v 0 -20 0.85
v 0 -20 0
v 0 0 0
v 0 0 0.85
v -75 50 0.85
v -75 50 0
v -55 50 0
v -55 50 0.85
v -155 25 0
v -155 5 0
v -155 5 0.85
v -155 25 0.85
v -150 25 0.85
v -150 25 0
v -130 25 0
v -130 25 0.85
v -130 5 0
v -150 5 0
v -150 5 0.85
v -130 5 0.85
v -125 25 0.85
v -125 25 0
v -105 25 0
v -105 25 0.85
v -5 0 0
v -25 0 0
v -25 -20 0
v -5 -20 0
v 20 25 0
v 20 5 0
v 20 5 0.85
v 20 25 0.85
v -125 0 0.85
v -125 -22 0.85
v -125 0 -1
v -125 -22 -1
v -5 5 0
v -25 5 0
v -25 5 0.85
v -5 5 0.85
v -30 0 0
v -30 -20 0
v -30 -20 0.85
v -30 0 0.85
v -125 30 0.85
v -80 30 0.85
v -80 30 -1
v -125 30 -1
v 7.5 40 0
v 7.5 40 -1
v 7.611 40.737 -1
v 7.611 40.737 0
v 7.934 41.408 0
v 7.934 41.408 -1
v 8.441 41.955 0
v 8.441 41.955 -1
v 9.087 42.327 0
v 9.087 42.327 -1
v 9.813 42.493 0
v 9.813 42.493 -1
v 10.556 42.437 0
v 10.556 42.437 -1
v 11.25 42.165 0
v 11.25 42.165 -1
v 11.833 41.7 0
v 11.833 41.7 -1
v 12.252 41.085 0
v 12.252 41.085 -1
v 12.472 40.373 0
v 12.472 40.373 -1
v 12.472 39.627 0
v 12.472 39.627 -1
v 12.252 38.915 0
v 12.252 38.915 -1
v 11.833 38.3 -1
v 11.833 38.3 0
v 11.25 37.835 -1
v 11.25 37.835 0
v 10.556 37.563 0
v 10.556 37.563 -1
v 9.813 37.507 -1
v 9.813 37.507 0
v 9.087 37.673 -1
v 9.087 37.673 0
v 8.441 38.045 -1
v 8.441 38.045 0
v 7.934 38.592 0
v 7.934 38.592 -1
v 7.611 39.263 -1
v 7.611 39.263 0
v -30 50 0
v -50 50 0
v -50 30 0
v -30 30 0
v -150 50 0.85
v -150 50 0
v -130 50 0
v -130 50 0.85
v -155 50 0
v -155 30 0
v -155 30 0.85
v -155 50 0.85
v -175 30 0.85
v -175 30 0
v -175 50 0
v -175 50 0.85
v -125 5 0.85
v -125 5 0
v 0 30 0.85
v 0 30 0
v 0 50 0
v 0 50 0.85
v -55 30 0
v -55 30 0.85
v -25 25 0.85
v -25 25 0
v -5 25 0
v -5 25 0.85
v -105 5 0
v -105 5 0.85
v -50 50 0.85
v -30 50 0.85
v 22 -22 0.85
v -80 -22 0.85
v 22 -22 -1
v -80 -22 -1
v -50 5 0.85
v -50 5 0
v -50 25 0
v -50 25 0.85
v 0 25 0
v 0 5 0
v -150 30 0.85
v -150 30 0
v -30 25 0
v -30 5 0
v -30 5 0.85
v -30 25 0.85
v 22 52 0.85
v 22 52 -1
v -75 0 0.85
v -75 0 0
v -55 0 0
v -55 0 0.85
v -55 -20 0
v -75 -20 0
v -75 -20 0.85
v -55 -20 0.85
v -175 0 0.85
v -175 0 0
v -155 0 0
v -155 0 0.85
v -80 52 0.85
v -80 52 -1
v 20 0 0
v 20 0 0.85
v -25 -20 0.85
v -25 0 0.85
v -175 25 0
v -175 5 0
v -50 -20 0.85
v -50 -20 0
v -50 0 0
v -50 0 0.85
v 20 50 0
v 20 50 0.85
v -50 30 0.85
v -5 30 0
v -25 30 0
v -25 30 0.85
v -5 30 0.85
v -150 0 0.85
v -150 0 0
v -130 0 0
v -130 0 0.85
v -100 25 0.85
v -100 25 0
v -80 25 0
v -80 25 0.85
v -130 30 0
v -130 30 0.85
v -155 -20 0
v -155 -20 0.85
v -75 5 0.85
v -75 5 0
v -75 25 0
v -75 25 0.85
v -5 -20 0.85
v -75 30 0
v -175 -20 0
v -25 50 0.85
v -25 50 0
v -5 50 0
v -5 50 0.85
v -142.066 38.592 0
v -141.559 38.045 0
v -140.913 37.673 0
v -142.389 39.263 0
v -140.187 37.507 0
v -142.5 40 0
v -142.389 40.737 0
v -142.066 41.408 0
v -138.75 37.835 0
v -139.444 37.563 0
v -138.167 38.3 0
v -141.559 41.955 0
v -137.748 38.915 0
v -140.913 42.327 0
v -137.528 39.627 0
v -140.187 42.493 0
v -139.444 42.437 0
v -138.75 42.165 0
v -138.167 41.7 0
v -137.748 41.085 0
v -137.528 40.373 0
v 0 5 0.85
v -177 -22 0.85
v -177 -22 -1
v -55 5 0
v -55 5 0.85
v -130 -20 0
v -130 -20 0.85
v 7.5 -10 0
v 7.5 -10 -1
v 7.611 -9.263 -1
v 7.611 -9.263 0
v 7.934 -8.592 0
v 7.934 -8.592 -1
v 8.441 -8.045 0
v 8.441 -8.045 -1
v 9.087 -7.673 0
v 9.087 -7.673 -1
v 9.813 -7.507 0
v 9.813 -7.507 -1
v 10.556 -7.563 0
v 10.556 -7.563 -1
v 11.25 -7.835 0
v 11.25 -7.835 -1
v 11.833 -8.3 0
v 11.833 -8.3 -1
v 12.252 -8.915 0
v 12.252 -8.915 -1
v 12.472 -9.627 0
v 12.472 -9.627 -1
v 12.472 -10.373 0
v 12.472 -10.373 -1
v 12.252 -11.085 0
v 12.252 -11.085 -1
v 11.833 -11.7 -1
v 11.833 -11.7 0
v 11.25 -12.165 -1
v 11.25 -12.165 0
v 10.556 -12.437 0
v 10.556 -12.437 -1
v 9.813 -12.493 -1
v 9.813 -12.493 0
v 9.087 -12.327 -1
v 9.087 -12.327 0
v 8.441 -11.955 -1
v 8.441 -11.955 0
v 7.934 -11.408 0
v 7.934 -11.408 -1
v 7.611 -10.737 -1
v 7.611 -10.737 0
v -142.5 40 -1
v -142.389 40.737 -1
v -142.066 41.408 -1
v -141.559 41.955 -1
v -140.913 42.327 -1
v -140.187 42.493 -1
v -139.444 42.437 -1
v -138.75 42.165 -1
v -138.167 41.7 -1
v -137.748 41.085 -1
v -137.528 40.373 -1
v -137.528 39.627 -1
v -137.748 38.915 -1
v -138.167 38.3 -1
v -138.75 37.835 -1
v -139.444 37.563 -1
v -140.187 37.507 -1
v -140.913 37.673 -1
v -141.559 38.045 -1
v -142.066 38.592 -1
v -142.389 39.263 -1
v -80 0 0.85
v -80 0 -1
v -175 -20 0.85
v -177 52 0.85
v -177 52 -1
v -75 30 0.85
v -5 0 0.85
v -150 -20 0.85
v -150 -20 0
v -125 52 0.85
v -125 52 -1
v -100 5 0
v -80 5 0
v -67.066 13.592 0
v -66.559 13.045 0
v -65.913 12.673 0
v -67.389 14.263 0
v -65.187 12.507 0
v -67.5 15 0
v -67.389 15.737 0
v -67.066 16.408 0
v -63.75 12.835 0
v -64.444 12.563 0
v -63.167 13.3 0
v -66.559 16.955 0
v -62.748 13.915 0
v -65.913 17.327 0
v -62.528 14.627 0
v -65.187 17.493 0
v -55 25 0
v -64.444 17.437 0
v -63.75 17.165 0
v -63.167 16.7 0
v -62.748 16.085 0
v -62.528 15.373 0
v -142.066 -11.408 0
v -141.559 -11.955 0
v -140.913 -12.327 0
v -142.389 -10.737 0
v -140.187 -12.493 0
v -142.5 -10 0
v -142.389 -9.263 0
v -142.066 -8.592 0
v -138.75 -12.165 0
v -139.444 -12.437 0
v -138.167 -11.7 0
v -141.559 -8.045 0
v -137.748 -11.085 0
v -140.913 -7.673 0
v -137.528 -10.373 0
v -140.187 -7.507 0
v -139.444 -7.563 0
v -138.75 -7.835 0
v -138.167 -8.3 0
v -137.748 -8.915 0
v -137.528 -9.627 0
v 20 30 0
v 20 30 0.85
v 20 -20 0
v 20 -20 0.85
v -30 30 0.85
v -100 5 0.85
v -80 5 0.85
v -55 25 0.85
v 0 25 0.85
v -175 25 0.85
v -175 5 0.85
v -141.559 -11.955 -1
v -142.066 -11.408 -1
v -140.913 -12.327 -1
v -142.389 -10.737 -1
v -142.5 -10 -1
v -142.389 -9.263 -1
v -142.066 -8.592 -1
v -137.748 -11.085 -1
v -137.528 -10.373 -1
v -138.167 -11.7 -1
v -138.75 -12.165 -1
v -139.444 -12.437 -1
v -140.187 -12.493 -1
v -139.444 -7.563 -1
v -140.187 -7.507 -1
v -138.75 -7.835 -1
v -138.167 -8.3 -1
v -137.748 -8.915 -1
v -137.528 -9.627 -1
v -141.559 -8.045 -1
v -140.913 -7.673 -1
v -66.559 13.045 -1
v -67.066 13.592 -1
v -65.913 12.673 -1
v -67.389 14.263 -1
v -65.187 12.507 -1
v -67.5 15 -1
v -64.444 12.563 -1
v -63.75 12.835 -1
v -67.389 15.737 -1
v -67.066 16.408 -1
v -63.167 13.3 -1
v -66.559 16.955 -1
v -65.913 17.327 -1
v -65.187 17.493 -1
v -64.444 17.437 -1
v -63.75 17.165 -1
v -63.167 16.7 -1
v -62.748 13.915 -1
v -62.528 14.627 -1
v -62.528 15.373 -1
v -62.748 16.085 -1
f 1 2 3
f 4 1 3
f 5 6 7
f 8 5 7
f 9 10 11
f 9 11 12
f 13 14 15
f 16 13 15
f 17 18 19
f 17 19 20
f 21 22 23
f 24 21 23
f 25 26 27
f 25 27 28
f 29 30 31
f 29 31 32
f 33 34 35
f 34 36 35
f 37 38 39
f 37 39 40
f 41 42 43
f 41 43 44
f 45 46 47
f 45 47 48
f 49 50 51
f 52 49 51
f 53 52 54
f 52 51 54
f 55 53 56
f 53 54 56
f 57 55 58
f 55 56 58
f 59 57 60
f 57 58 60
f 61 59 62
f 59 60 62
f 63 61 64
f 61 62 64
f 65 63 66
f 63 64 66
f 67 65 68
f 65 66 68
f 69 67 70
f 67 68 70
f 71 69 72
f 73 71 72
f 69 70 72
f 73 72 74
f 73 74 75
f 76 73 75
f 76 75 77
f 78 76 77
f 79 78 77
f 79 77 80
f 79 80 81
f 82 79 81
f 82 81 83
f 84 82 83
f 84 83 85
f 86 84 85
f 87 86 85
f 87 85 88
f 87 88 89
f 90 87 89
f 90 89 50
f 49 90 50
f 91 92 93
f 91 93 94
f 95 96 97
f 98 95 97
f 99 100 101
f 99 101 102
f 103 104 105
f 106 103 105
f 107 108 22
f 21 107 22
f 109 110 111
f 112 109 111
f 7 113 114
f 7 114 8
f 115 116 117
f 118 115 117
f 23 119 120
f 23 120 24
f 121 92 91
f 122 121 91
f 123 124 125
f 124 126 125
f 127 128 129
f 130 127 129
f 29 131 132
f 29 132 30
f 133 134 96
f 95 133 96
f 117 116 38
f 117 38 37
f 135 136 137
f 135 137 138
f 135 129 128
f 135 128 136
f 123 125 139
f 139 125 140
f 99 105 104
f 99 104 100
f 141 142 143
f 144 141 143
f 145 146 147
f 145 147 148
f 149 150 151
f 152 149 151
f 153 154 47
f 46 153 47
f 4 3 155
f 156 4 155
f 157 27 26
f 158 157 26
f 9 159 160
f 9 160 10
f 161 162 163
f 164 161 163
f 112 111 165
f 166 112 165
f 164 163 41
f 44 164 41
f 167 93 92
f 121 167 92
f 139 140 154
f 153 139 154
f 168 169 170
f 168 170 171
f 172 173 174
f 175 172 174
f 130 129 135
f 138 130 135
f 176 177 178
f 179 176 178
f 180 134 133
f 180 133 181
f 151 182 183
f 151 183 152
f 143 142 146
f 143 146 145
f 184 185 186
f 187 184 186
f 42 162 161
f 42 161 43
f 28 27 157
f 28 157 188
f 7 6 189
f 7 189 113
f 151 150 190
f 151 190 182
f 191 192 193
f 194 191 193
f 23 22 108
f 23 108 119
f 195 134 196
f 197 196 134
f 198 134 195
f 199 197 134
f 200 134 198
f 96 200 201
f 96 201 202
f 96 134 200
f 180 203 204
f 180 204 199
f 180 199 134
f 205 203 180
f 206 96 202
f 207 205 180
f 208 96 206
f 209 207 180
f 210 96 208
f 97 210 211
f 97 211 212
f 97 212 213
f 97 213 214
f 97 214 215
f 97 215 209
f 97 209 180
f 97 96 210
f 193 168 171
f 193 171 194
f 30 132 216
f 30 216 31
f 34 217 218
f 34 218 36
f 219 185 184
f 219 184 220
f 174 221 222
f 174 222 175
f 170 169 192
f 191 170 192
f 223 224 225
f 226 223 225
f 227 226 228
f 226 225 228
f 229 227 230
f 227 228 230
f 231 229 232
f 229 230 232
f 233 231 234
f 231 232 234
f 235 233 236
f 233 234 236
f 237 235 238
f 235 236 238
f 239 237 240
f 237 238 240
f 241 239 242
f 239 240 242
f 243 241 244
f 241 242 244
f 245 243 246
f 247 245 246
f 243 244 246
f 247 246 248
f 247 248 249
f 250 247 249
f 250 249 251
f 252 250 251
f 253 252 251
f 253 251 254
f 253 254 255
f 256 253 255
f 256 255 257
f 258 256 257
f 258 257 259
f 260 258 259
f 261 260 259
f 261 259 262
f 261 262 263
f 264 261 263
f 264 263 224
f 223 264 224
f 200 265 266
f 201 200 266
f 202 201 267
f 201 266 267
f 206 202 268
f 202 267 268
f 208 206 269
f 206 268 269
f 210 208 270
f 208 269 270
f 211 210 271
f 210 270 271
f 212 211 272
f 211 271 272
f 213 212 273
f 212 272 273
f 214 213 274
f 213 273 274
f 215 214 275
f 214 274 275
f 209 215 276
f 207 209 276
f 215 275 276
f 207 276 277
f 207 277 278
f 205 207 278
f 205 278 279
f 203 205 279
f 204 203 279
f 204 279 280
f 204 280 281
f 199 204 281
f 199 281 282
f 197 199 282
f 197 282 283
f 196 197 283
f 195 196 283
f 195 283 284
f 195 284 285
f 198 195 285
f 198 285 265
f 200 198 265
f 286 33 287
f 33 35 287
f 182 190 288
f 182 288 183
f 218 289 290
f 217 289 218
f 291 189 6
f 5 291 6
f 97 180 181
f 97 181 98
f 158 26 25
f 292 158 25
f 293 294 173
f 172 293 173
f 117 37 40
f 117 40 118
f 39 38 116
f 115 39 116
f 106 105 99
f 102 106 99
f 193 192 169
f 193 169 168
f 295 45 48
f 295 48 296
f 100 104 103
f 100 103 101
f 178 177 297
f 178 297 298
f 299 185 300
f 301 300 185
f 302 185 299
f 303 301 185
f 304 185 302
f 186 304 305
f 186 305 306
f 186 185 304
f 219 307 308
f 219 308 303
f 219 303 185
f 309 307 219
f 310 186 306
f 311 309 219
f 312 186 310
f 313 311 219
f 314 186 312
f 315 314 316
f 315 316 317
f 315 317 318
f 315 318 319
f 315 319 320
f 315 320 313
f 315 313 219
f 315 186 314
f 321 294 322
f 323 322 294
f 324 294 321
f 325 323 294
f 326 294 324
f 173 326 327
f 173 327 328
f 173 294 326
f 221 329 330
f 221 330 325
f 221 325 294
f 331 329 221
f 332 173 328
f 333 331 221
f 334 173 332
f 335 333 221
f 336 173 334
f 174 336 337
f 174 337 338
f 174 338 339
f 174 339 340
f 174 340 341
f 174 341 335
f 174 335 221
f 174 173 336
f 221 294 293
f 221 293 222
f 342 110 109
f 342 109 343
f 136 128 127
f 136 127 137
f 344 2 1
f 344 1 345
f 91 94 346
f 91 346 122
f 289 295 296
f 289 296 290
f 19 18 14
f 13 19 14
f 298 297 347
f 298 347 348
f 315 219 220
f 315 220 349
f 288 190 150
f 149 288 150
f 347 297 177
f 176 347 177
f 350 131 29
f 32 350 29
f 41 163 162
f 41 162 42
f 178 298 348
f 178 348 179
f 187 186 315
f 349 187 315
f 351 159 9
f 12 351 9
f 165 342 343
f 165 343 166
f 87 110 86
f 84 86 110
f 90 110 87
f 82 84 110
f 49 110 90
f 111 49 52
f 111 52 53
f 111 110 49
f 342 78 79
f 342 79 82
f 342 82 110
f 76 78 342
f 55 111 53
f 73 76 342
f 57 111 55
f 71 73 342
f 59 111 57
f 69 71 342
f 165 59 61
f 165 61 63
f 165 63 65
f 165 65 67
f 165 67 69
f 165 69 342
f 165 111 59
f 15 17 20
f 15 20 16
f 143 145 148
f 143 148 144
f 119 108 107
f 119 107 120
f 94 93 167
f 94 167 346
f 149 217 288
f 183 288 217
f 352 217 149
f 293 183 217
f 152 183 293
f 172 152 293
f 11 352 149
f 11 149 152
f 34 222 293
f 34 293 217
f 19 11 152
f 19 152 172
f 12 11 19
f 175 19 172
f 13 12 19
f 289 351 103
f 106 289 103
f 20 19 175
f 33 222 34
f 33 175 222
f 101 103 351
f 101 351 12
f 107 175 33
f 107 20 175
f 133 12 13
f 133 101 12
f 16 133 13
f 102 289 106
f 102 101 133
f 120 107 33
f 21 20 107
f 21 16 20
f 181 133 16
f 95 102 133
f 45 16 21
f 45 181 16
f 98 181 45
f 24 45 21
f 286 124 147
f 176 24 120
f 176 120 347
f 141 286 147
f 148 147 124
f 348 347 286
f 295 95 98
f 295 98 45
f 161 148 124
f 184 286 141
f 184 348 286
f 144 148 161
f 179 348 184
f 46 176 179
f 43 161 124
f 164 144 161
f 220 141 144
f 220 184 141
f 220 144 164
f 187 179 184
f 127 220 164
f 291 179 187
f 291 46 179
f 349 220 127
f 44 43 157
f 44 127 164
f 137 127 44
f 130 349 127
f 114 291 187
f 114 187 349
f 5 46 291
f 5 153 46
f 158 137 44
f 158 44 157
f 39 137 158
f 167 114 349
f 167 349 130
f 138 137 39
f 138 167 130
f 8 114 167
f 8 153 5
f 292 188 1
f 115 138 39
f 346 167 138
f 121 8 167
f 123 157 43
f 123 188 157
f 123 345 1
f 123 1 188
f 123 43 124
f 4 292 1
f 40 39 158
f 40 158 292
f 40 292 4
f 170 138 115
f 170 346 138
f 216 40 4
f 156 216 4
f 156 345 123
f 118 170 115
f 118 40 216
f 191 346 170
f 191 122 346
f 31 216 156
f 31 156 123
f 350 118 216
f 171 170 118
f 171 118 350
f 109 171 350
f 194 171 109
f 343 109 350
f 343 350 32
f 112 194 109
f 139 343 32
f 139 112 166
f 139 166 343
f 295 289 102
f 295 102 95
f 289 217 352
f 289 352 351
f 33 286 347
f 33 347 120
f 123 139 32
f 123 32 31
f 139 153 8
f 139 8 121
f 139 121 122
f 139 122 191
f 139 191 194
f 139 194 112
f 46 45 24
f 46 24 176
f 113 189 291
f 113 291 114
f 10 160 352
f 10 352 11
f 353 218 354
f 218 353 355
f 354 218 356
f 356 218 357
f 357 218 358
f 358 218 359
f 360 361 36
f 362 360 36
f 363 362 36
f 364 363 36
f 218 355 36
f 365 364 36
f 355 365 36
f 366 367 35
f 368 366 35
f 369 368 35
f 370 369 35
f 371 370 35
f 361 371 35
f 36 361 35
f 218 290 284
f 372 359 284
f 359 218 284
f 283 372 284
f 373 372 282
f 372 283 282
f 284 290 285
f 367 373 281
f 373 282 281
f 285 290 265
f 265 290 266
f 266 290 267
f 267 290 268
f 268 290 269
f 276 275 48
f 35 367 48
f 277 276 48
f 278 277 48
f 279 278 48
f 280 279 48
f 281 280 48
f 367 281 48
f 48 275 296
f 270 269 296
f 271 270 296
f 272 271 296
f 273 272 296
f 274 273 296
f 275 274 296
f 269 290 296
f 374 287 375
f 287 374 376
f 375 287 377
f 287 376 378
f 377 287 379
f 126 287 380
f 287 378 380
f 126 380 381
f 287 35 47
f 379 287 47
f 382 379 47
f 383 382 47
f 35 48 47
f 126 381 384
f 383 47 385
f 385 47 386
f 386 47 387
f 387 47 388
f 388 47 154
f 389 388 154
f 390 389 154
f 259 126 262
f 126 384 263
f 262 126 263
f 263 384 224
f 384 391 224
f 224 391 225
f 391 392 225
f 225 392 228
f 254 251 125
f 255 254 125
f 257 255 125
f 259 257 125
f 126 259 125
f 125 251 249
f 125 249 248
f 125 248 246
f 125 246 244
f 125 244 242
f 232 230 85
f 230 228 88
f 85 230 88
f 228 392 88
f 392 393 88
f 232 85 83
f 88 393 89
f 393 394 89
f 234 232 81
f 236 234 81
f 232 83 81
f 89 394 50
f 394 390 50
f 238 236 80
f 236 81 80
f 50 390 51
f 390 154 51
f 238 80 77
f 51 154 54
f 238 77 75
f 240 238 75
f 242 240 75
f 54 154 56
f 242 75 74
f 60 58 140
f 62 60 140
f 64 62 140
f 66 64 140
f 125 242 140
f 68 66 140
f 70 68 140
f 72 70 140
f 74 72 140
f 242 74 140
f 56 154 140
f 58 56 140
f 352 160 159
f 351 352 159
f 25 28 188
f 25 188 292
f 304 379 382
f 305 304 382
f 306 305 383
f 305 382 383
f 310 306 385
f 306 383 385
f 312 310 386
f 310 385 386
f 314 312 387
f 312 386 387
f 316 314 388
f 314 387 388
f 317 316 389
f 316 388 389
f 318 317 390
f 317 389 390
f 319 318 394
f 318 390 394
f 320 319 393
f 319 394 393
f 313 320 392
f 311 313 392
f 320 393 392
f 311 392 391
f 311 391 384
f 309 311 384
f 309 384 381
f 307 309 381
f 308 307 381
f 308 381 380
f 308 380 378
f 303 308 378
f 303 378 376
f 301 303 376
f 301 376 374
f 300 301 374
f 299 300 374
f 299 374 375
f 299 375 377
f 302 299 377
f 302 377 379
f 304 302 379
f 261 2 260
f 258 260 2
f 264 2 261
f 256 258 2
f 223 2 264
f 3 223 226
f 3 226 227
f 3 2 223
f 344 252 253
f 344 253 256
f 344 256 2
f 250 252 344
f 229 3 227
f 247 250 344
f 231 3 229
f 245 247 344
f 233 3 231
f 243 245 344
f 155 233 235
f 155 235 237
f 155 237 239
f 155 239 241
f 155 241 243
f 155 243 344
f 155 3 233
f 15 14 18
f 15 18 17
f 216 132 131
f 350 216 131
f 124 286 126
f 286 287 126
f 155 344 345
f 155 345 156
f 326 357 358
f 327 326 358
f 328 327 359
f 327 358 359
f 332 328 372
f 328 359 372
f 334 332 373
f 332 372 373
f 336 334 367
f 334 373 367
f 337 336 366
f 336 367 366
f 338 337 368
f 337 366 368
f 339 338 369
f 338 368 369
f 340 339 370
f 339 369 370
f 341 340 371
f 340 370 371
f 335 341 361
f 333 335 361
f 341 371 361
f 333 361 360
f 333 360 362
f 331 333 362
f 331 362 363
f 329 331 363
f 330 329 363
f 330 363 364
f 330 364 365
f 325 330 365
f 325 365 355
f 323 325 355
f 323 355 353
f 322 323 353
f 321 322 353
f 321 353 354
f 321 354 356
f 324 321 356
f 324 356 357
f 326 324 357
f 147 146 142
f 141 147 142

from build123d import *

# Parameters (mm, degrees)
F0_W      = 20
F0_H      = 20
F1_DEPTH  = 0.85
F1_FACE_W = 20
F1_FACE_H = 20
F2_DEPTH  = 1
F3_D      = 5


with BuildPart() as f1:
    # F0 (on Top) → F1 (new body)
    with BuildSketch(Plane.XY):
        Polygon((-125, 52), (-177, 52), (-177, -22), (-125, -22), (-125, 0), (-80, 0), (-80, -22), (22, -22), (22, 52), (-80, 52), (-80, 30), (-125, 30), align=None)
        with Locations((-165, -10)):
            Rectangle(F0_W, F0_H, mode=Mode.SUBTRACT)
        with Locations((-140, -10)):
            Rectangle(F0_W, F0_H, mode=Mode.SUBTRACT)
        with Locations((-65, -10)):
            Rectangle(F0_W, F0_H, mode=Mode.SUBTRACT)
        with Locations((-40, -10)):
            Rectangle(F0_W, F0_H, mode=Mode.SUBTRACT)
        with Locations((-15, -10)):
            Rectangle(F0_W, F0_H, mode=Mode.SUBTRACT)
        with Locations((10, -10)):
            Rectangle(F0_W, F0_H, mode=Mode.SUBTRACT)
        with Locations((-165, 15)):
            Rectangle(F0_W, F0_H, mode=Mode.SUBTRACT)
        with Locations((-140, 15)):
            Rectangle(F0_W, F0_H, mode=Mode.SUBTRACT)
        with Locations((-115, 15)):
            Rectangle(F0_W, F0_H, mode=Mode.SUBTRACT)
        with Locations((-90, 15)):
            Rectangle(F0_W, F0_H, mode=Mode.SUBTRACT)
        with Locations((-165, 40)):
            Rectangle(F0_W, F0_H, mode=Mode.SUBTRACT)
        with Locations((-140, 40)):
            Rectangle(F0_W, F0_H, mode=Mode.SUBTRACT)
        with Locations((-65, 15)):
            Rectangle(F0_W, F0_H, mode=Mode.SUBTRACT)
        with Locations((-40, 15)):
            Rectangle(F0_W, F0_H, mode=Mode.SUBTRACT)
        with Locations((-15, 15)):
            Rectangle(F0_W, F0_H, mode=Mode.SUBTRACT)
        with Locations((10, 15)):
            Rectangle(F0_W, F0_H, mode=Mode.SUBTRACT)
        with Locations((-65, 40)):
            Rectangle(F0_W, F0_H, mode=Mode.SUBTRACT)
        with Locations((-40, 40)):
            Rectangle(F0_W, F0_H, mode=Mode.SUBTRACT)
        with Locations((-15, 40)):
            Rectangle(F0_W, F0_H, mode=Mode.SUBTRACT)
        with Locations((10, 40)):
            Rectangle(F0_W, F0_H, mode=Mode.SUBTRACT)
    extrude(amount=F1_DEPTH)

    # F0 (on Top) + F1_face (on face) → F2 (join)
    with BuildSketch(Plane.XY):
        Polygon((-125, 52), (-177, 52), (-177, -22), (-125, -22), (-125, 0), (-80, 0), (-80, -22), (22, -22), (22, 52), (-80, 52), (-80, 30), (-125, 30), align=None)
        with Locations((-165, -10)):
            Rectangle(F0_W, F0_H, mode=Mode.SUBTRACT)
        with Locations((-140, -10)):
            Rectangle(F0_W, F0_H, mode=Mode.SUBTRACT)
        with Locations((-65, -10)):
            Rectangle(F0_W, F0_H, mode=Mode.SUBTRACT)
        with Locations((-40, -10)):
            Rectangle(F0_W, F0_H, mode=Mode.SUBTRACT)
        with Locations((-15, -10)):
            Rectangle(F0_W, F0_H, mode=Mode.SUBTRACT)
        with Locations((10, -10)):
            Rectangle(F0_W, F0_H, mode=Mode.SUBTRACT)
        with Locations((-165, 15)):
            Rectangle(F0_W, F0_H, mode=Mode.SUBTRACT)
        with Locations((-140, 15)):
            Rectangle(F0_W, F0_H, mode=Mode.SUBTRACT)
        with Locations((-115, 15)):
            Rectangle(F0_W, F0_H, mode=Mode.SUBTRACT)
        with Locations((-90, 15)):
            Rectangle(F0_W, F0_H, mode=Mode.SUBTRACT)
        with Locations((-165, 40)):
            Rectangle(F0_W, F0_H, mode=Mode.SUBTRACT)
        with Locations((-140, 40)):
            Rectangle(F0_W, F0_H, mode=Mode.SUBTRACT)
        with Locations((-65, 15)):
            Rectangle(F0_W, F0_H, mode=Mode.SUBTRACT)
        with Locations((-40, 15)):
            Rectangle(F0_W, F0_H, mode=Mode.SUBTRACT)
        with Locations((-15, 15)):
            Rectangle(F0_W, F0_H, mode=Mode.SUBTRACT)
        with Locations((10, 15)):
            Rectangle(F0_W, F0_H, mode=Mode.SUBTRACT)
        with Locations((-65, 40)):
            Rectangle(F0_W, F0_H, mode=Mode.SUBTRACT)
        with Locations((-40, 40)):
            Rectangle(F0_W, F0_H, mode=Mode.SUBTRACT)
        with Locations((-15, 40)):
            Rectangle(F0_W, F0_H, mode=Mode.SUBTRACT)
        with Locations((10, 40)):
            Rectangle(F0_W, F0_H, mode=Mode.SUBTRACT)
        with Locations((-140, 15)):
            Rectangle(F0_W, F0_H)
        with Locations((-165, 15)):
            Rectangle(F0_W, F0_H)
        with Locations((-165, 40)):
            Rectangle(F0_W, F0_H)
        with Locations((-140, 40)):
            Rectangle(F0_W, F0_H)
        with Locations((-115, 15)):
            Rectangle(F0_W, F0_H)
        with Locations((-140, -10)):
            Rectangle(F0_W, F0_H)
        with Locations((-165, -10)):
            Rectangle(F0_W, F0_H)
        with Locations((-90, 15)):
            Rectangle(F0_W, F0_H)
        with Locations((-65, 40)):
            Rectangle(F0_W, F0_H)
        with Locations((-65, 15)):
            Rectangle(F0_W, F0_H)
        with Locations((-40, 15)):
            Rectangle(F0_W, F0_H)
        with Locations((-65, -10)):
            Rectangle(F0_W, F0_H)
        with Locations((-40, -10)):
            Rectangle(F0_W, F0_H)
        with Locations((-40, 40)):
            Rectangle(F0_W, F0_H)
        with Locations((-15, 40)):
            Rectangle(F0_W, F0_H)
        with Locations((-15, 15)):
            Rectangle(F0_W, F0_H)
        with Locations((-15, -10)):
            Rectangle(F0_W, F0_H)
        with Locations((10, -10)):
            Rectangle(F0_W, F0_H)
        with Locations((10, 15)):
            Rectangle(F0_W, F0_H)
        with Locations((10, 40)):
            Rectangle(F0_W, F0_H)
    with BuildSketch(Plane(origin=(-75.49831437, 15, 0.85), x_dir=(1, 0, 0), z_dir=(0, 0, 1))):
        Polygon((-49.50168563, 37), (-101.50168563, 37), (-101.50168563, -37), (-49.50168563, -37), (-49.50168563, -15), (-4.50168563, -15), (-4.50168563, -37), (97.49831437, -37), (97.49831437, 37), (-4.50168563, 37), (-4.50168563, 15), (-49.50168563, 15), align=None)
        with Locations((-89.50168563, -25)):
            Rectangle(F1_FACE_W, F1_FACE_H, mode=Mode.SUBTRACT)
        with Locations((-64.50168563, -25)):
            Rectangle(F1_FACE_W, F1_FACE_H, mode=Mode.SUBTRACT)
        with Locations((10.49831437, -25)):
            Rectangle(F1_FACE_W, F1_FACE_H, mode=Mode.SUBTRACT)
        with Locations((35.49831437, -25)):
            Rectangle(F1_FACE_W, F1_FACE_H, mode=Mode.SUBTRACT)
        with Locations((60.49831437, -25)):
            Rectangle(F1_FACE_W, F1_FACE_H, mode=Mode.SUBTRACT)
        with Locations((85.49831437, -25)):
            Rectangle(F1_FACE_W, F1_FACE_H, mode=Mode.SUBTRACT)
        with Locations((-89.50168563, 0)):
            Rectangle(F1_FACE_W, F1_FACE_H, mode=Mode.SUBTRACT)
        with Locations((-64.50168563, 0)):
            Rectangle(F1_FACE_W, F1_FACE_H, mode=Mode.SUBTRACT)
        with Locations((-39.50168563, 0)):
            Rectangle(F1_FACE_W, F1_FACE_H, mode=Mode.SUBTRACT)
        with Locations((-14.50168563, 0)):
            Rectangle(F1_FACE_W, F1_FACE_H, mode=Mode.SUBTRACT)
        with Locations((-89.50168563, 25)):
            Rectangle(F1_FACE_W, F1_FACE_H, mode=Mode.SUBTRACT)
        with Locations((-64.50168563, 25)):
            Rectangle(F1_FACE_W, F1_FACE_H, mode=Mode.SUBTRACT)
        with Locations((10.49831437, 0)):
            Rectangle(F1_FACE_W, F1_FACE_H, mode=Mode.SUBTRACT)
        with Locations((35.49831437, 0)):
            Rectangle(F1_FACE_W, F1_FACE_H, mode=Mode.SUBTRACT)
        with Locations((60.49831437, 0)):
            Rectangle(F1_FACE_W, F1_FACE_H, mode=Mode.SUBTRACT)
        with Locations((85.49831437, 0)):
            Rectangle(F1_FACE_W, F1_FACE_H, mode=Mode.SUBTRACT)
        with Locations((10.49831437, 25)):
            Rectangle(F1_FACE_W, F1_FACE_H, mode=Mode.SUBTRACT)
        with Locations((35.49831437, 25)):
            Rectangle(F1_FACE_W, F1_FACE_H, mode=Mode.SUBTRACT)
        with Locations((60.49831437, 25)):
            Rectangle(F1_FACE_W, F1_FACE_H, mode=Mode.SUBTRACT)
        with Locations((85.49831437, 25)):
            Rectangle(F1_FACE_W, F1_FACE_H, mode=Mode.SUBTRACT)
    extrude(amount=-F2_DEPTH)

    # F3 (through all)
    with Locations(Plane.XY):
        with Locations((-140, 40), (-140, -10), (-65, 15), (10, -10), (10, 40)):
            Hole(F3_D / 2)


solid = f1.part
